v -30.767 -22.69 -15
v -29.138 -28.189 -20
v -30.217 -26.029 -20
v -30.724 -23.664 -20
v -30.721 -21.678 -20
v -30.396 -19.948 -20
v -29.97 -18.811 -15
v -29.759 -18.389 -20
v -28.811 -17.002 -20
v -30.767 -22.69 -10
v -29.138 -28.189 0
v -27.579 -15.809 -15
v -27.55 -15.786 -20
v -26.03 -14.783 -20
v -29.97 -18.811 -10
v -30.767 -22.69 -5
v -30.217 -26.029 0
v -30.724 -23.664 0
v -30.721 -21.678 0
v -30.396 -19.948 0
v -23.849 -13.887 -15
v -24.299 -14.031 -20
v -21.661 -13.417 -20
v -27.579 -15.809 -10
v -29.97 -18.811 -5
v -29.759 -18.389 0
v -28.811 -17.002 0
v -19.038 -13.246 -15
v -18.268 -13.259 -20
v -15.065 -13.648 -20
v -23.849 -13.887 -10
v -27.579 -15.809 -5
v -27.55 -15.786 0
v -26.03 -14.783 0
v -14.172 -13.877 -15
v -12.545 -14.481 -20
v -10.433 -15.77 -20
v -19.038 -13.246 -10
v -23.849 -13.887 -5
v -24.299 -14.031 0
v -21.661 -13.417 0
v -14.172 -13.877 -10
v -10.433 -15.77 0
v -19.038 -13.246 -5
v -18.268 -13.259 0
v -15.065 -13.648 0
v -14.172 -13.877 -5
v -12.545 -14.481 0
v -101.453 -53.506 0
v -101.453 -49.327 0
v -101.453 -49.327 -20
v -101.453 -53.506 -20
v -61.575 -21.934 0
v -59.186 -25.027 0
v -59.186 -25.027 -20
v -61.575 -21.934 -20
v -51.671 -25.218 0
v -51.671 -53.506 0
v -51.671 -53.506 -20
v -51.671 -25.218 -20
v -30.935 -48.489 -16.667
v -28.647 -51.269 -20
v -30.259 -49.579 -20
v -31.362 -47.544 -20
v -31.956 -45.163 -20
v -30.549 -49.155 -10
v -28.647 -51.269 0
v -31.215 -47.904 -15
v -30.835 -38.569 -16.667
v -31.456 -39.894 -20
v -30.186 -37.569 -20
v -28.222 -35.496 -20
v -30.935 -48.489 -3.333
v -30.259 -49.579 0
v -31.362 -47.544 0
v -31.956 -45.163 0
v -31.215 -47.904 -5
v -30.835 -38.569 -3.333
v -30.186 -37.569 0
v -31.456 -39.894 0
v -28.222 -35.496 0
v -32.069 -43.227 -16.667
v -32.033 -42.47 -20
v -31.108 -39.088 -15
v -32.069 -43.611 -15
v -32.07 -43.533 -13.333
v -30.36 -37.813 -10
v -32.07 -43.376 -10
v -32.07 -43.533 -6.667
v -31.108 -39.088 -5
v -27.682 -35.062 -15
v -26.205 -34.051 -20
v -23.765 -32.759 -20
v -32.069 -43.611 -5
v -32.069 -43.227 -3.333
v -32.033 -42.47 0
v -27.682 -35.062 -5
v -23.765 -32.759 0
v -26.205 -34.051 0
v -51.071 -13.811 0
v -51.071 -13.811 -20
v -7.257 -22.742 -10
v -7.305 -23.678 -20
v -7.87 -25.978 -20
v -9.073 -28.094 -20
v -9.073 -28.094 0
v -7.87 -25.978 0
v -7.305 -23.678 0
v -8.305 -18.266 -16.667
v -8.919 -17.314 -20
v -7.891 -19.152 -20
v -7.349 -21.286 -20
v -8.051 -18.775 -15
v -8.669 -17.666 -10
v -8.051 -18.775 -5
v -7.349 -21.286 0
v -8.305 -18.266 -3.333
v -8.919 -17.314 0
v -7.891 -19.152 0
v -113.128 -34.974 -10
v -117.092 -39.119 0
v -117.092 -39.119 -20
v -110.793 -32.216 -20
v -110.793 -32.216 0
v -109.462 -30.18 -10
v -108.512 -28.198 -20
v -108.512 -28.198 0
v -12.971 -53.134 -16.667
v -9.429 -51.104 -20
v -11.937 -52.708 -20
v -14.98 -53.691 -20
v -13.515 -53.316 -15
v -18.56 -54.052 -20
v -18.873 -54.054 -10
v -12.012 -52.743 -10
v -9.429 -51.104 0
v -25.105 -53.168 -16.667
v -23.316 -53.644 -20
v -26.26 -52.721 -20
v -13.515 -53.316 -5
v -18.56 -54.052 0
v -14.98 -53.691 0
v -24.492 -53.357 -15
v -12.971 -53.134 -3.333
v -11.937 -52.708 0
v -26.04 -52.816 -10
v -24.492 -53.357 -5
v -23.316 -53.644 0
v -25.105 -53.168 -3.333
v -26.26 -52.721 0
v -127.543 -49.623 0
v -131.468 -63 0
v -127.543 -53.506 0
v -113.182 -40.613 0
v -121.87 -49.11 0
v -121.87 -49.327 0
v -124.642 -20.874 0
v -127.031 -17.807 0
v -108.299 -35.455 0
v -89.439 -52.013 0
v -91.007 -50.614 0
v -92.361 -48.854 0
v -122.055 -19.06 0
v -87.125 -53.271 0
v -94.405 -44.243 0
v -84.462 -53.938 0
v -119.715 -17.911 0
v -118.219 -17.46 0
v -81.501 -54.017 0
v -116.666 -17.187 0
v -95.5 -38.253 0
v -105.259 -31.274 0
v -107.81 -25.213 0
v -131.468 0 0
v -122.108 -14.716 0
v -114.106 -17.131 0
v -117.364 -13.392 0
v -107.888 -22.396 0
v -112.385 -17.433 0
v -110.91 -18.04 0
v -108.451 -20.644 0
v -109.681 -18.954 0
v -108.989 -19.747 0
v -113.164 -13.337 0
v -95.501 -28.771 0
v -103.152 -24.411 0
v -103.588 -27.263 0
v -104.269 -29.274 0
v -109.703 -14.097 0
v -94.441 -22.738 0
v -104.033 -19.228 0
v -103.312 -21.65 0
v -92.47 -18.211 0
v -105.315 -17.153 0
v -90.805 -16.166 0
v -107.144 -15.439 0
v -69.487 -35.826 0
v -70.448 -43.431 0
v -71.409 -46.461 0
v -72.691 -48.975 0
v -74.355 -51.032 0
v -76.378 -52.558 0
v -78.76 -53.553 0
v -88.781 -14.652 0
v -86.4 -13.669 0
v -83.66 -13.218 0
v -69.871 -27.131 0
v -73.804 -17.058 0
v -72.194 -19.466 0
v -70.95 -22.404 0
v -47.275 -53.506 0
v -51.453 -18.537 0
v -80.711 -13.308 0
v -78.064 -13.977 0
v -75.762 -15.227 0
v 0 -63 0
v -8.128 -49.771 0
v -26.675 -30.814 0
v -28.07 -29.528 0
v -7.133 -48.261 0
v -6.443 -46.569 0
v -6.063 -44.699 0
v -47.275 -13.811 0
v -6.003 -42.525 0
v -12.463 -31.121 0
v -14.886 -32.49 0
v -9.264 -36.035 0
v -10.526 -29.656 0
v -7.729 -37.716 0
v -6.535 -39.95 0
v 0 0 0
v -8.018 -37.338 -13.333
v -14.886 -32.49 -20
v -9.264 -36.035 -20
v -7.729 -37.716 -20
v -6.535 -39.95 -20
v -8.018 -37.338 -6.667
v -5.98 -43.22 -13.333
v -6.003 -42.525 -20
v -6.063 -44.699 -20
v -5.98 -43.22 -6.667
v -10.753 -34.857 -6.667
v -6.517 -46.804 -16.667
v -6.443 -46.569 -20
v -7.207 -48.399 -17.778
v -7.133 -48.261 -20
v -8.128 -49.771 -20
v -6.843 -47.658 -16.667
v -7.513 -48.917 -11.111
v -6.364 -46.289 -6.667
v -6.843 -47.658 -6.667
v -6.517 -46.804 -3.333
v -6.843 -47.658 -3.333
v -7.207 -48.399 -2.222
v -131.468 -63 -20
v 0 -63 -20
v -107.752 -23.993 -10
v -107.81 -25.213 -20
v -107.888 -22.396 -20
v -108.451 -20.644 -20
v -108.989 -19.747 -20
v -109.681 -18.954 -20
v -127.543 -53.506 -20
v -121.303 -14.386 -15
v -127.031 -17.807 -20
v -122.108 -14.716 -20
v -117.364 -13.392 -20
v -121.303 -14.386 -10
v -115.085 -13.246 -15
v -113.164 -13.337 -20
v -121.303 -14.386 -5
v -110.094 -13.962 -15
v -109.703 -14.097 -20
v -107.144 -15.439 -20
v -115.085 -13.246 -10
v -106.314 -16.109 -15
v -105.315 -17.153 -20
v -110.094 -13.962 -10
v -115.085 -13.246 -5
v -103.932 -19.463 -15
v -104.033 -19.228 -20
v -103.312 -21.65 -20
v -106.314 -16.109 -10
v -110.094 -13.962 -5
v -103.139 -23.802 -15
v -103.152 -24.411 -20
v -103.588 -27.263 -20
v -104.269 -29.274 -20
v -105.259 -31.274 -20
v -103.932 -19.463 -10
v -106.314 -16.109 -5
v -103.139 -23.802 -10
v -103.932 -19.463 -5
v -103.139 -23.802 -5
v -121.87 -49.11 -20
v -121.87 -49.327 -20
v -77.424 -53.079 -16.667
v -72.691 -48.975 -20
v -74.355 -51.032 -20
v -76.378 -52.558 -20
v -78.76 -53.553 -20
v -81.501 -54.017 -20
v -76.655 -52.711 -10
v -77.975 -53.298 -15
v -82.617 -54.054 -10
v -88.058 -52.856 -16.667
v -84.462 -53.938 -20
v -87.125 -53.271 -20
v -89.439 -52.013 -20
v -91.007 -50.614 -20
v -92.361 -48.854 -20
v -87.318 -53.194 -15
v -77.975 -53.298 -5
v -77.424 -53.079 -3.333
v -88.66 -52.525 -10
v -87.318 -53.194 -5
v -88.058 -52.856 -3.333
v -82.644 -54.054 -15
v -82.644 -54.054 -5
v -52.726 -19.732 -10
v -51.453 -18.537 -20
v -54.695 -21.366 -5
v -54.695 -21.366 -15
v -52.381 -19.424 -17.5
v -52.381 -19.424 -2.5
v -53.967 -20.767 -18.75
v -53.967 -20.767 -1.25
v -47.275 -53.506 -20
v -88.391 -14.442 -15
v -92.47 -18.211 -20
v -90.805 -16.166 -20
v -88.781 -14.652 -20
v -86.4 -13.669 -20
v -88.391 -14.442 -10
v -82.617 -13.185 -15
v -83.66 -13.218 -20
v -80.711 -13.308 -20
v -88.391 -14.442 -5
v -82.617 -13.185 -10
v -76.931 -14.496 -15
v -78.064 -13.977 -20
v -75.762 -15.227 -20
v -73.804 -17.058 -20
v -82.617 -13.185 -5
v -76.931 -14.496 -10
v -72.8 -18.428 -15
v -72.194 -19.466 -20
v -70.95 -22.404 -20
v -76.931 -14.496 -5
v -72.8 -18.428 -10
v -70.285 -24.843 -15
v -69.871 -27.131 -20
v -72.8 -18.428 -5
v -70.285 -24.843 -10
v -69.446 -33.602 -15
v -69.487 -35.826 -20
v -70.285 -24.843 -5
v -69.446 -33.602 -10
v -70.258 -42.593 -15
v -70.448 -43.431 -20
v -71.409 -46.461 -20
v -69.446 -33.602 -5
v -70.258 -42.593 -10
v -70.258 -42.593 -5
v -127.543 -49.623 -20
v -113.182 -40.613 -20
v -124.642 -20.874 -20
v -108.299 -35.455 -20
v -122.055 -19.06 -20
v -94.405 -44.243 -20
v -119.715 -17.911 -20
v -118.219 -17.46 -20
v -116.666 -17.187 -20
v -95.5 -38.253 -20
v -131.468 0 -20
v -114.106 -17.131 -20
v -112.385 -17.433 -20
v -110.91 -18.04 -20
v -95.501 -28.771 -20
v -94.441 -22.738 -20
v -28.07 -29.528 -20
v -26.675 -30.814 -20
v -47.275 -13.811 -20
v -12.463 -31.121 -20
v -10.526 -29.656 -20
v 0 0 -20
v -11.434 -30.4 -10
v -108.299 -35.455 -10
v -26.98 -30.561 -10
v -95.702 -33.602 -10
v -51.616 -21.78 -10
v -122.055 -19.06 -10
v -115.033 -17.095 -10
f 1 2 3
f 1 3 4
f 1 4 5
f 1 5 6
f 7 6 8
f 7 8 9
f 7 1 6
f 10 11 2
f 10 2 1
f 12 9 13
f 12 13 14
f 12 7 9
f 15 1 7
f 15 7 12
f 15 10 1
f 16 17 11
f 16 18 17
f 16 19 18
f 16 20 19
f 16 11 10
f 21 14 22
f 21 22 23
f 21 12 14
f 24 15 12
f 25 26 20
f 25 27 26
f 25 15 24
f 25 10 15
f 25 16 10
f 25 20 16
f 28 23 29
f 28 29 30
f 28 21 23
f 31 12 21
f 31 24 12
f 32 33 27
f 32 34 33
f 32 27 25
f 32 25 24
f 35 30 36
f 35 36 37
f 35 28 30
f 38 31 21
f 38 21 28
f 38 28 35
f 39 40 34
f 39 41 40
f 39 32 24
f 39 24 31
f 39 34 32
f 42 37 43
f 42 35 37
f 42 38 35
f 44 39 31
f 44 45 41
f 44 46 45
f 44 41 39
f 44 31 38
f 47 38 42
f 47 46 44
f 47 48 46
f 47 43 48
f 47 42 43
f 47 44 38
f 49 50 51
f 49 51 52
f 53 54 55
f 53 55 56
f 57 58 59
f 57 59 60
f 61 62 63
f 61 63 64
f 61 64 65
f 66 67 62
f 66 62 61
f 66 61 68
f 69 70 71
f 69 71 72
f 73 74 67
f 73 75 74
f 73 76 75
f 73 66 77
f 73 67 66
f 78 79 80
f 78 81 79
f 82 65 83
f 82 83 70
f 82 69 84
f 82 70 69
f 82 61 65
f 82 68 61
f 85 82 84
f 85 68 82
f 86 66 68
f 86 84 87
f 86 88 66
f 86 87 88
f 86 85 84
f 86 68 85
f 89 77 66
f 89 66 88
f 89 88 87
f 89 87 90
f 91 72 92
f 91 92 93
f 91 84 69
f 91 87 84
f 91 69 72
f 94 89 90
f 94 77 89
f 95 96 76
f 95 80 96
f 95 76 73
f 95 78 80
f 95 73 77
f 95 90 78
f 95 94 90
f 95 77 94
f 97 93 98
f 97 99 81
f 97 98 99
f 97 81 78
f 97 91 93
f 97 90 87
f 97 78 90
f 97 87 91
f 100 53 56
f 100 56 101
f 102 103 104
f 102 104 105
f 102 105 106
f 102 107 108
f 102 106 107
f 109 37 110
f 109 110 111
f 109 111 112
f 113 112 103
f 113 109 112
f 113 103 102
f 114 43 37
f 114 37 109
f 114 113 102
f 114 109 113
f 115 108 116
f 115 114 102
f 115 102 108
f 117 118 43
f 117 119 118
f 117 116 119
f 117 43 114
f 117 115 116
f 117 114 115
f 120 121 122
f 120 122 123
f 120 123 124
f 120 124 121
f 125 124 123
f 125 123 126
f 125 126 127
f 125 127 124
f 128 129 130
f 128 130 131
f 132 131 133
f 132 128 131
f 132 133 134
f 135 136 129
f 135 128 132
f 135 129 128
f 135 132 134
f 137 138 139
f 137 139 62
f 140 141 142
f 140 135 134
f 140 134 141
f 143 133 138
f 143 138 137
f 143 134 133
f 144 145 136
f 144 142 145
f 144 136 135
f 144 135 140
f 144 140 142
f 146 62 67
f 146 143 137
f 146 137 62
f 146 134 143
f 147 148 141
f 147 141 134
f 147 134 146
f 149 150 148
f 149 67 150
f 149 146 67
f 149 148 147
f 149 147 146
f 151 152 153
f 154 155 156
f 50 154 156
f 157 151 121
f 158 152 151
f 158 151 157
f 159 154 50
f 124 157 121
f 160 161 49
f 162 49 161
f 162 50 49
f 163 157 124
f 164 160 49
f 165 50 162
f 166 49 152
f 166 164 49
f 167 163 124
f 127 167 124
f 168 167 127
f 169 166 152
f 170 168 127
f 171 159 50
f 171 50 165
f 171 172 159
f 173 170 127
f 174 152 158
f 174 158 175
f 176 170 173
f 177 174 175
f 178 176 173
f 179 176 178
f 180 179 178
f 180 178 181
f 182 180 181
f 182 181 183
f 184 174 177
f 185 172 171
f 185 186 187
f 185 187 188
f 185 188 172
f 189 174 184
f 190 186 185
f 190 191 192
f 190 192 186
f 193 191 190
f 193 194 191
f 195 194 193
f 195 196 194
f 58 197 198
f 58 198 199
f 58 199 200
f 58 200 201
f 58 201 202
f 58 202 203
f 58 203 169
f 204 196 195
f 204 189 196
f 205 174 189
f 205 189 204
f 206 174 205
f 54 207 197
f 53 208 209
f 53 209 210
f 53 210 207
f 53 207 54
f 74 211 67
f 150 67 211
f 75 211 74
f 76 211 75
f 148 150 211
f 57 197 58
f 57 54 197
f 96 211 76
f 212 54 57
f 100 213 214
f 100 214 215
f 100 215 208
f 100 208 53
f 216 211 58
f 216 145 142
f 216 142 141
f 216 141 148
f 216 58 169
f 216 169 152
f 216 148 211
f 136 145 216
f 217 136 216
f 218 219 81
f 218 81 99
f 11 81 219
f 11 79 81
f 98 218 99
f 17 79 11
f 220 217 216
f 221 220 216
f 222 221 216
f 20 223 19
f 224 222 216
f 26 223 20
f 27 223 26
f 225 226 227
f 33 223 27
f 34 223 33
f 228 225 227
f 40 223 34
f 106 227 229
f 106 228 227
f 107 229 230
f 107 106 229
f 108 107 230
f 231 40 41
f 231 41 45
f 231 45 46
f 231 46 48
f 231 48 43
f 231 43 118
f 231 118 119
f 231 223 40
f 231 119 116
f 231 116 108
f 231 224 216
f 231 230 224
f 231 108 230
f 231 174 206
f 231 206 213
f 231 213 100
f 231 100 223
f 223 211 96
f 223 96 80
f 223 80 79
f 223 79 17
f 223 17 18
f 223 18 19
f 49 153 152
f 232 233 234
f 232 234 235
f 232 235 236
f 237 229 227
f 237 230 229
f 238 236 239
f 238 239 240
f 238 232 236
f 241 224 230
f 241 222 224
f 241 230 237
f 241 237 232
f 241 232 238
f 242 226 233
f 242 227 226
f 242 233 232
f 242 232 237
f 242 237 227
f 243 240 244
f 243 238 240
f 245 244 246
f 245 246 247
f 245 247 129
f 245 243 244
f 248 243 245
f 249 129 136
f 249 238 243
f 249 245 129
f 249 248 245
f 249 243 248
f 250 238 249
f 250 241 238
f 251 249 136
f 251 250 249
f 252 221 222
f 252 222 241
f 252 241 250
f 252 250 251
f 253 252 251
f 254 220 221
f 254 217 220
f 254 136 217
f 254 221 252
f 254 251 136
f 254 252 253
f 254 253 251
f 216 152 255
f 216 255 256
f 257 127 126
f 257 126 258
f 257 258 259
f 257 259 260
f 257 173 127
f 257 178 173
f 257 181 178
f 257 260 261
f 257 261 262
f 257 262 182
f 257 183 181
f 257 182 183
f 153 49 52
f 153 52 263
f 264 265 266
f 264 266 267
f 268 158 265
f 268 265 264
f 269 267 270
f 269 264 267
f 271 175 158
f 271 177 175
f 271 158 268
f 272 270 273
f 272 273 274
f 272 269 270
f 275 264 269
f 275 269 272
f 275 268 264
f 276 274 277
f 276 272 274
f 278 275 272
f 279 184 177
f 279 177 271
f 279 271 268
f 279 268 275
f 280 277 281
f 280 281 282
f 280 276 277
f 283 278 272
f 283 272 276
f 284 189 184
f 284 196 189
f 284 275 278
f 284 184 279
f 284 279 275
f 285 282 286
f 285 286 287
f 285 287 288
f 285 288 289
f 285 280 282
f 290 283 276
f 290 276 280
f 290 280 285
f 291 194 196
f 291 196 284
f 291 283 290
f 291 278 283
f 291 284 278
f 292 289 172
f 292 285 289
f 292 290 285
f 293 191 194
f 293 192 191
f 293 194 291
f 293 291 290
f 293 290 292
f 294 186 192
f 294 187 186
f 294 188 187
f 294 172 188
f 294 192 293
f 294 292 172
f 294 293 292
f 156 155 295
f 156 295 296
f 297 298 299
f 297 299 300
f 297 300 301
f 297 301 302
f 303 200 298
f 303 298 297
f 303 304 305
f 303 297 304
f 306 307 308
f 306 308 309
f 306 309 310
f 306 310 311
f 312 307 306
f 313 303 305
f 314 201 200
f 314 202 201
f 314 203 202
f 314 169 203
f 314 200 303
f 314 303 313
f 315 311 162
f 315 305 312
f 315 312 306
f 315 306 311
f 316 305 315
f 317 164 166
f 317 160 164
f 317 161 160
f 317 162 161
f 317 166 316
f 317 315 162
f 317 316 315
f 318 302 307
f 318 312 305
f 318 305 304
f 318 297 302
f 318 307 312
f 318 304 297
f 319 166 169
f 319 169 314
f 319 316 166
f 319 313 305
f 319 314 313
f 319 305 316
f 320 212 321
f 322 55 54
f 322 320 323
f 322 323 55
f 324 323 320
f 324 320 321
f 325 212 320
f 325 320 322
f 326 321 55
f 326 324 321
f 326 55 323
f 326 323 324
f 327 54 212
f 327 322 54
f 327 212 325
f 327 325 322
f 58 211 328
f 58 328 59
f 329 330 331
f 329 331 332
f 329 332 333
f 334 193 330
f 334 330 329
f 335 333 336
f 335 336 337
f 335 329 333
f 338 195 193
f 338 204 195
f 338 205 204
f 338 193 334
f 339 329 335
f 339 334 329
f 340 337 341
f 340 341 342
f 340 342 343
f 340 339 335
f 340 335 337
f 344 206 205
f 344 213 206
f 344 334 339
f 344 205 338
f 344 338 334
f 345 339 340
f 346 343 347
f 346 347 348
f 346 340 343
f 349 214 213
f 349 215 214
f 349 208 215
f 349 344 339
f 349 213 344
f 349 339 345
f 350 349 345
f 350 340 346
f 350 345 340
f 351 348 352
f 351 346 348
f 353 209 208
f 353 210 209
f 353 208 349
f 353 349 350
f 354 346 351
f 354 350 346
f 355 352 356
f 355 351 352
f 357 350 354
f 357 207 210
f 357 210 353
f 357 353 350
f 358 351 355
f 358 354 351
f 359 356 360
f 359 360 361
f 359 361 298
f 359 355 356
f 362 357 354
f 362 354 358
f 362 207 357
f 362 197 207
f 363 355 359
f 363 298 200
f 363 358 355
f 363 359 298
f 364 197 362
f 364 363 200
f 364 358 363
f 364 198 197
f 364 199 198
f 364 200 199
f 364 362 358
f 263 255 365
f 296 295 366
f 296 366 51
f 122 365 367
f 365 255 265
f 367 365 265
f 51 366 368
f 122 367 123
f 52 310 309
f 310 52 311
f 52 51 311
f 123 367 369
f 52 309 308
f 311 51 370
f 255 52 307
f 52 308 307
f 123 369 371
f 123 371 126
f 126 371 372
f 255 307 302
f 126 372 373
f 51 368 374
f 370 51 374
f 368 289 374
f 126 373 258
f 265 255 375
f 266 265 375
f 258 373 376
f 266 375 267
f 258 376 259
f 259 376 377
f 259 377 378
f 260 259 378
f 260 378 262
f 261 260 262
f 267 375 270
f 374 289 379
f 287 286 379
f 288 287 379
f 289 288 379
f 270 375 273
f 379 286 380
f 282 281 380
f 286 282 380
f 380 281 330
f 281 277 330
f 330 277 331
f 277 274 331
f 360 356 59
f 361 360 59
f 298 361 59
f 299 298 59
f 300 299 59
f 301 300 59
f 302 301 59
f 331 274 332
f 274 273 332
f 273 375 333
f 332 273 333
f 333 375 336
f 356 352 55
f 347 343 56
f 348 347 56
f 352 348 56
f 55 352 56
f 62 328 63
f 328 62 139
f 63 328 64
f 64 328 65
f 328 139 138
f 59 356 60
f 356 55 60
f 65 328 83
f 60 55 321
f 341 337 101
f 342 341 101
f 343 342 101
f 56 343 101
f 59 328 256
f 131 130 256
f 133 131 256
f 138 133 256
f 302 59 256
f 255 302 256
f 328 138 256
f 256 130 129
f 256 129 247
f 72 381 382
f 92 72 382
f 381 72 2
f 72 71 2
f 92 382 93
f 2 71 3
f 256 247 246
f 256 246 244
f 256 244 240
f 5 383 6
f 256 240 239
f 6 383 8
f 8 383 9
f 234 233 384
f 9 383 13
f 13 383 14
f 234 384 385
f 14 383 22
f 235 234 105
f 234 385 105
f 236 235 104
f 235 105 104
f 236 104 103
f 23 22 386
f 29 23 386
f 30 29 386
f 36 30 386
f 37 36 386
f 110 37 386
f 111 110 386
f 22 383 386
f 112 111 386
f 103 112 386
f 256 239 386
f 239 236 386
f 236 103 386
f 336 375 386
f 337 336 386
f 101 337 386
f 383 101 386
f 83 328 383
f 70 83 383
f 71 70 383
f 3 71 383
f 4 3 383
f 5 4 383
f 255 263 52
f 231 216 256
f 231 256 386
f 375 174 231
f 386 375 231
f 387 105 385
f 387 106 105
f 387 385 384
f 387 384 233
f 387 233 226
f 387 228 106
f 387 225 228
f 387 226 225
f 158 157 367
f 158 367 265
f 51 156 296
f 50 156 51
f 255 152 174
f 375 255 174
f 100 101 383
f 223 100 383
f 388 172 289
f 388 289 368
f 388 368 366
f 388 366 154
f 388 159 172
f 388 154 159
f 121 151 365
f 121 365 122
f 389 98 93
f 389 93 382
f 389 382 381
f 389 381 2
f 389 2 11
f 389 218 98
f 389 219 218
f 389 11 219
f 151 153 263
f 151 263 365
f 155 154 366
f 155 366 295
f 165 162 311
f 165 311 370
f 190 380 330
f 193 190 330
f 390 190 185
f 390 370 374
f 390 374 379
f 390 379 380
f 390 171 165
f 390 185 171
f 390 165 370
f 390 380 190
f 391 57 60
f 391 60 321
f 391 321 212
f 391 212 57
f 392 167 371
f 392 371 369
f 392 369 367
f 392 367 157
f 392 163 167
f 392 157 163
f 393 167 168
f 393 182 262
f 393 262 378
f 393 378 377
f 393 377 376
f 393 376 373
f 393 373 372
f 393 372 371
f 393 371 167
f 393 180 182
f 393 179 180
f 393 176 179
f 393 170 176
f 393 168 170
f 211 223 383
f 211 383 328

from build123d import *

# Parameters (mm, degrees)
F0_W     = 131.467973601
F0_H     = 63
F1_DEPTH = 20


with BuildPart() as f1:
    # F0 (on Top) → F1 (new body)
    with BuildSketch(Plane.XY):
        with Locations((-65.7339868005, -31.5)):
            Rectangle(F0_W, F0_H)
        with BuildLine():
            Line((-101.4531498872, -49.3273232344), (-101.4531498872, -53.5062699422))
            Line((-101.4531498872, -53.5062699422), (-127.5433306843, -53.5062699422))
            Line((-127.5433306843, -53.5062699422), (-127.5433306843, -49.6227165568))
            Line((-127.5433306843, -49.6227165568), (-117.0916198954, -39.1188775346))
            add(Edge.make_bspline(
                [(-117.0916198954, -39.1188775346), (-112.313198504, -34.279639871), (-110.7927916977, -32.2162306338)],
                knots=[0, 0, 0, 1, 1, 1], degree=2))
            add(Edge.make_bspline(
                [(-110.7927916977, -32.2162306338), (-109.2723848913, -30.1528213966), (-108.5121814882, -28.1980126456)],
                knots=[0, 0, 0, 1, 1, 1], degree=2))
            add(Edge.make_bspline(
                [(-108.5121814882, -28.1980126456), (-107.751978085, -26.2432038945), (-107.751978085, -23.9930018211)],
                knots=[0, 0, 0, 1, 1, 1], degree=2))
            add(Edge.make_bspline(
                [(-107.751978085, -23.9930018211), (-107.751978085, -20.8131795861), (-109.6807227193, -18.9539392629)],
                knots=[0, 0, 0, 1, 1, 1], degree=2))
            add(Edge.make_bspline(
                [(-109.6807227193, -18.9539392629), (-111.6094673537, -17.0946989397), (-115.0325546777, -17.0946989397)],
                knots=[0, 0, 0, 1, 1, 1], degree=2))
            add(Edge.make_bspline(
                [(-115.0325546777, -17.0946989397), (-117.4999577234, -17.0946989397), (-119.7154076413, -17.9113745957)],
                knots=[0, 0, 0, 1, 1, 1], degree=2))
            add(Edge.make_bspline(
                [(-119.7154076413, -17.9113745957), (-121.9308575591, -18.7280502517), (-124.6415256938, -20.8739958584)],
                knots=[0, 0, 0, 1, 1, 1], degree=2))
            Line((-124.6415256938, -20.8739958584), (-127.0307363895, -17.807118129))
            add(Edge.make_bspline(
                [(-127.0307363895, -17.807118129), (-121.5485838478, -13.2458977099), (-115.084682911, -13.2458977099)],
                knots=[0, 0, 0, 1, 1, 1], degree=2))
            add(Edge.make_bspline(
                [(-115.084682911, -13.2458977099), (-109.4895858637, -13.2458977099), (-106.3141076481, -16.1086065253)],
                knots=[0, 0, 0, 1, 1, 1], degree=2))
            add(Edge.make_bspline(
                [(-106.3141076481, -16.1086065253), (-103.1386294325, -18.9713153407), (-103.1386294325, -23.8018649655)],
                knots=[0, 0, 0, 1, 1, 1], degree=2))
            add(Edge.make_bspline(
                [(-103.1386294325, -23.8018649655), (-103.1386294325, -27.5811618841), (-105.2585109226, -31.2735784139)],
                knots=[0, 0, 0, 1, 1, 1], degree=2))
            add(Edge.make_bspline(
                [(-105.2585109226, -31.2735784139), (-107.3783924126, -34.9659949436), (-113.1820023934, -40.6132202243)],
                knots=[0, 0, 0, 1, 1, 1], degree=2))
            Line((-113.1820023934, -40.6132202243), (-121.8700412868, -49.1101222621))
            Line((-121.8700412868, -49.1101222621), (-121.8700412868, -49.3273232344))
            Line((-121.8700412868, -49.3273232344), (-101.4531498872, -49.3273232344))
        make_face(mode=Mode.SUBTRACT)
        with BuildLine():
            add(Edge.make_bspline(
                [(-72.7999976166, -18.4283129099), (-69.4464146037, -23.6715443821), (-69.4464146037, -33.6019728373)],
                knots=[0, 0, 0, 1, 1, 1], degree=2))
            add(Edge.make_bspline(
                [(-69.4464146037, -33.6019728373), (-69.4464146037, -43.897298926), (-72.6913971304, -48.9754576593)],
                knots=[0, 0, 0, 1, 1, 1], degree=2))
            add(Edge.make_bspline(
                [(-72.6913971304, -48.9754576593), (-75.9363796571, -54.0536163925), (-82.6174815662, -54.0536163925)],
                knots=[0, 0, 0, 1, 1, 1], degree=2))
            add(Edge.make_bspline(
                [(-82.6174815662, -54.0536163925), (-89.0205662307, -54.0536163925), (-92.3611171852, -48.8538251148)],
                knots=[0, 0, 0, 1, 1, 1], degree=2))
            add(Edge.make_bspline(
                [(-92.3611171852, -48.8538251148), (-95.7016681398, -43.654033837), (-95.7016681398, -33.6019728373)],
                knots=[0, 0, 0, 1, 1, 1], degree=2))
            add(Edge.make_bspline(
                [(-95.7016681398, -33.6019728373), (-95.7016681398, -23.2371424374), (-92.4697176714, -18.2111119375)],
                knots=[0, 0, 0, 1, 1, 1], degree=2))
            add(Edge.make_bspline(
                [(-92.4697176714, -18.2111119375), (-89.237767203, -13.1850814377), (-82.6174815662, -13.1850814377)],
                knots=[0, 0, 0, 1, 1, 1], degree=2))
            add(Edge.make_bspline(
                [(-82.6174815662, -13.1850814377), (-76.1535806295, -13.1850814377), (-72.7999976166, -18.4283129099)],
                knots=[0, 0, 0, 1, 1, 1], degree=2))
        make_face(mode=Mode.SUBTRACT)
        with BuildLine():
            Line((-47.2745393476, -13.810620238), (-47.2745393476, -53.5062699422))
            Line((-47.2745393476, -53.5062699422), (-51.6706870277, -53.5062699422))
            Line((-51.6706870277, -53.5062699422), (-51.6706870277, -25.2180153051))
            add(Edge.make_bspline(
                [(-51.6706870277, -25.2180153051), (-51.6706870277, -21.6819834755), (-51.4534860554, -18.536913396)],
                knots=[0, 0, 0, 1, 1, 1], degree=2))
            add(Edge.make_bspline(
                [(-51.4534860554, -18.536913396), (-52.0182085835, -19.110323963), (-52.7262837533, -19.7315187439)],
                knots=[0, 0, 0, 1, 1, 1], degree=2))
            add(Edge.make_bspline(
                [(-52.7262837533, -19.7315187439), (-53.4343589231, -20.3527135248), (-59.1858406706, -25.0268784495)],
                knots=[0, 0, 0, 1, 1, 1], degree=2))
            Line((-59.1858406706, -25.0268784495), (-61.5750513663, -21.9339366034))
            Line((-61.5750513663, -21.9339366034), (-51.0712123441, -13.810620238))
            Line((-51.0712123441, -13.810620238), (-47.2745393476, -13.810620238))
        make_face(mode=Mode.SUBTRACT)
        with BuildLine():
            add(Edge.make_bspline(
                [(-27.5787551762, -15.8088691835), (-24.3902449023, -13.2458977099), (-19.0384129439, -13.2458977099)],
                knots=[0, 0, 0, 1, 1, 1], degree=2))
            add(Edge.make_bspline(
                [(-19.0384129439, -13.2458977099), (-13.6083886355, -13.2458977099), (-10.43291042, -15.7697730085)],
                knots=[0, 0, 0, 1, 1, 1], degree=2))
            add(Edge.make_bspline(
                [(-10.43291042, -15.7697730085), (-7.2574322044, -18.293648307), (-7.2574322044, -22.7419242205)],
                knots=[0, 0, 0, 1, 1, 1], degree=2))
            add(Edge.make_bspline(
                [(-7.2574322044, -22.7419242205), (-7.2574322044, -25.6784813665), (-9.0732323331, -28.0937561788)],
                knots=[0, 0, 0, 1, 1, 1], degree=2))
            add(Edge.make_bspline(
                [(-9.0732323331, -28.0937561788), (-10.8890324619, -30.5090309912), (-14.8855303528, -32.4899038589)],
                knots=[0, 0, 0, 1, 1, 1], degree=2))
            add(Edge.make_bspline(
                [(-14.8855303528, -32.4899038589), (-10.0549807281, -34.8009222046), (-8.0176356076, -37.3378295615)],
                knots=[0, 0, 0, 1, 1, 1], degree=2))
            add(Edge.make_bspline(
                [(-8.0176356076, -37.3378295615), (-5.9802904871, -39.8747369184), (-5.9802904871, -43.2196318924)],
                knots=[0, 0, 0, 1, 1, 1], degree=2))
            add(Edge.make_bspline(
                [(-5.9802904871, -43.2196318924), (-5.9802904871, -48.1544379838), (-9.4294419278, -51.1040271882)],
                knots=[0, 0, 0, 1, 1, 1], degree=2))
            add(Edge.make_bspline(
                [(-9.4294419278, -51.1040271882), (-12.8785933685, -54.0536163925), (-18.8733402049, -54.0536163925)],
                knots=[0, 0, 0, 1, 1, 1], degree=2))
            add(Edge.make_bspline(
                [(-18.8733402049, -54.0536163925), (-25.2242966361, -54.0536163925), (-28.6473839601, -51.2690999271)],
                knots=[0, 0, 0, 1, 1, 1], degree=2))
            add(Edge.make_bspline(
                [(-28.6473839601, -51.2690999271), (-32.0704712841, -48.4845834618), (-32.0704712841, -43.3760165924)],
                knots=[0, 0, 0, 1, 1, 1], degree=2))
            add(Edge.make_bspline(
                [(-32.0704712841, -43.3760165924), (-32.0704712841, -36.5645941), (-23.764706102, -32.7592330646)],
                knots=[0, 0, 0, 1, 1, 1], degree=2))
            add(Edge.make_bspline(
                [(-23.764706102, -32.7592330646), (-27.509250865, -30.6480396135), (-29.1382581576, -28.1893246067)],
                knots=[0, 0, 0, 1, 1, 1], degree=2))
            add(Edge.make_bspline(
                [(-29.1382581576, -28.1893246067), (-30.7672654501, -25.7306095998), (-30.7672654501, -22.6897959871)],
                knots=[0, 0, 0, 1, 1, 1], degree=2))
            add(Edge.make_bspline(
                [(-30.7672654501, -22.6897959871), (-30.7672654501, -18.3718406571), (-27.5787551762, -15.8088691835)],
                knots=[0, 0, 0, 1, 1, 1], degree=2))
        make_face(mode=Mode.SUBTRACT)
    extrude(amount=-F1_DEPTH)


solid = f1.part
